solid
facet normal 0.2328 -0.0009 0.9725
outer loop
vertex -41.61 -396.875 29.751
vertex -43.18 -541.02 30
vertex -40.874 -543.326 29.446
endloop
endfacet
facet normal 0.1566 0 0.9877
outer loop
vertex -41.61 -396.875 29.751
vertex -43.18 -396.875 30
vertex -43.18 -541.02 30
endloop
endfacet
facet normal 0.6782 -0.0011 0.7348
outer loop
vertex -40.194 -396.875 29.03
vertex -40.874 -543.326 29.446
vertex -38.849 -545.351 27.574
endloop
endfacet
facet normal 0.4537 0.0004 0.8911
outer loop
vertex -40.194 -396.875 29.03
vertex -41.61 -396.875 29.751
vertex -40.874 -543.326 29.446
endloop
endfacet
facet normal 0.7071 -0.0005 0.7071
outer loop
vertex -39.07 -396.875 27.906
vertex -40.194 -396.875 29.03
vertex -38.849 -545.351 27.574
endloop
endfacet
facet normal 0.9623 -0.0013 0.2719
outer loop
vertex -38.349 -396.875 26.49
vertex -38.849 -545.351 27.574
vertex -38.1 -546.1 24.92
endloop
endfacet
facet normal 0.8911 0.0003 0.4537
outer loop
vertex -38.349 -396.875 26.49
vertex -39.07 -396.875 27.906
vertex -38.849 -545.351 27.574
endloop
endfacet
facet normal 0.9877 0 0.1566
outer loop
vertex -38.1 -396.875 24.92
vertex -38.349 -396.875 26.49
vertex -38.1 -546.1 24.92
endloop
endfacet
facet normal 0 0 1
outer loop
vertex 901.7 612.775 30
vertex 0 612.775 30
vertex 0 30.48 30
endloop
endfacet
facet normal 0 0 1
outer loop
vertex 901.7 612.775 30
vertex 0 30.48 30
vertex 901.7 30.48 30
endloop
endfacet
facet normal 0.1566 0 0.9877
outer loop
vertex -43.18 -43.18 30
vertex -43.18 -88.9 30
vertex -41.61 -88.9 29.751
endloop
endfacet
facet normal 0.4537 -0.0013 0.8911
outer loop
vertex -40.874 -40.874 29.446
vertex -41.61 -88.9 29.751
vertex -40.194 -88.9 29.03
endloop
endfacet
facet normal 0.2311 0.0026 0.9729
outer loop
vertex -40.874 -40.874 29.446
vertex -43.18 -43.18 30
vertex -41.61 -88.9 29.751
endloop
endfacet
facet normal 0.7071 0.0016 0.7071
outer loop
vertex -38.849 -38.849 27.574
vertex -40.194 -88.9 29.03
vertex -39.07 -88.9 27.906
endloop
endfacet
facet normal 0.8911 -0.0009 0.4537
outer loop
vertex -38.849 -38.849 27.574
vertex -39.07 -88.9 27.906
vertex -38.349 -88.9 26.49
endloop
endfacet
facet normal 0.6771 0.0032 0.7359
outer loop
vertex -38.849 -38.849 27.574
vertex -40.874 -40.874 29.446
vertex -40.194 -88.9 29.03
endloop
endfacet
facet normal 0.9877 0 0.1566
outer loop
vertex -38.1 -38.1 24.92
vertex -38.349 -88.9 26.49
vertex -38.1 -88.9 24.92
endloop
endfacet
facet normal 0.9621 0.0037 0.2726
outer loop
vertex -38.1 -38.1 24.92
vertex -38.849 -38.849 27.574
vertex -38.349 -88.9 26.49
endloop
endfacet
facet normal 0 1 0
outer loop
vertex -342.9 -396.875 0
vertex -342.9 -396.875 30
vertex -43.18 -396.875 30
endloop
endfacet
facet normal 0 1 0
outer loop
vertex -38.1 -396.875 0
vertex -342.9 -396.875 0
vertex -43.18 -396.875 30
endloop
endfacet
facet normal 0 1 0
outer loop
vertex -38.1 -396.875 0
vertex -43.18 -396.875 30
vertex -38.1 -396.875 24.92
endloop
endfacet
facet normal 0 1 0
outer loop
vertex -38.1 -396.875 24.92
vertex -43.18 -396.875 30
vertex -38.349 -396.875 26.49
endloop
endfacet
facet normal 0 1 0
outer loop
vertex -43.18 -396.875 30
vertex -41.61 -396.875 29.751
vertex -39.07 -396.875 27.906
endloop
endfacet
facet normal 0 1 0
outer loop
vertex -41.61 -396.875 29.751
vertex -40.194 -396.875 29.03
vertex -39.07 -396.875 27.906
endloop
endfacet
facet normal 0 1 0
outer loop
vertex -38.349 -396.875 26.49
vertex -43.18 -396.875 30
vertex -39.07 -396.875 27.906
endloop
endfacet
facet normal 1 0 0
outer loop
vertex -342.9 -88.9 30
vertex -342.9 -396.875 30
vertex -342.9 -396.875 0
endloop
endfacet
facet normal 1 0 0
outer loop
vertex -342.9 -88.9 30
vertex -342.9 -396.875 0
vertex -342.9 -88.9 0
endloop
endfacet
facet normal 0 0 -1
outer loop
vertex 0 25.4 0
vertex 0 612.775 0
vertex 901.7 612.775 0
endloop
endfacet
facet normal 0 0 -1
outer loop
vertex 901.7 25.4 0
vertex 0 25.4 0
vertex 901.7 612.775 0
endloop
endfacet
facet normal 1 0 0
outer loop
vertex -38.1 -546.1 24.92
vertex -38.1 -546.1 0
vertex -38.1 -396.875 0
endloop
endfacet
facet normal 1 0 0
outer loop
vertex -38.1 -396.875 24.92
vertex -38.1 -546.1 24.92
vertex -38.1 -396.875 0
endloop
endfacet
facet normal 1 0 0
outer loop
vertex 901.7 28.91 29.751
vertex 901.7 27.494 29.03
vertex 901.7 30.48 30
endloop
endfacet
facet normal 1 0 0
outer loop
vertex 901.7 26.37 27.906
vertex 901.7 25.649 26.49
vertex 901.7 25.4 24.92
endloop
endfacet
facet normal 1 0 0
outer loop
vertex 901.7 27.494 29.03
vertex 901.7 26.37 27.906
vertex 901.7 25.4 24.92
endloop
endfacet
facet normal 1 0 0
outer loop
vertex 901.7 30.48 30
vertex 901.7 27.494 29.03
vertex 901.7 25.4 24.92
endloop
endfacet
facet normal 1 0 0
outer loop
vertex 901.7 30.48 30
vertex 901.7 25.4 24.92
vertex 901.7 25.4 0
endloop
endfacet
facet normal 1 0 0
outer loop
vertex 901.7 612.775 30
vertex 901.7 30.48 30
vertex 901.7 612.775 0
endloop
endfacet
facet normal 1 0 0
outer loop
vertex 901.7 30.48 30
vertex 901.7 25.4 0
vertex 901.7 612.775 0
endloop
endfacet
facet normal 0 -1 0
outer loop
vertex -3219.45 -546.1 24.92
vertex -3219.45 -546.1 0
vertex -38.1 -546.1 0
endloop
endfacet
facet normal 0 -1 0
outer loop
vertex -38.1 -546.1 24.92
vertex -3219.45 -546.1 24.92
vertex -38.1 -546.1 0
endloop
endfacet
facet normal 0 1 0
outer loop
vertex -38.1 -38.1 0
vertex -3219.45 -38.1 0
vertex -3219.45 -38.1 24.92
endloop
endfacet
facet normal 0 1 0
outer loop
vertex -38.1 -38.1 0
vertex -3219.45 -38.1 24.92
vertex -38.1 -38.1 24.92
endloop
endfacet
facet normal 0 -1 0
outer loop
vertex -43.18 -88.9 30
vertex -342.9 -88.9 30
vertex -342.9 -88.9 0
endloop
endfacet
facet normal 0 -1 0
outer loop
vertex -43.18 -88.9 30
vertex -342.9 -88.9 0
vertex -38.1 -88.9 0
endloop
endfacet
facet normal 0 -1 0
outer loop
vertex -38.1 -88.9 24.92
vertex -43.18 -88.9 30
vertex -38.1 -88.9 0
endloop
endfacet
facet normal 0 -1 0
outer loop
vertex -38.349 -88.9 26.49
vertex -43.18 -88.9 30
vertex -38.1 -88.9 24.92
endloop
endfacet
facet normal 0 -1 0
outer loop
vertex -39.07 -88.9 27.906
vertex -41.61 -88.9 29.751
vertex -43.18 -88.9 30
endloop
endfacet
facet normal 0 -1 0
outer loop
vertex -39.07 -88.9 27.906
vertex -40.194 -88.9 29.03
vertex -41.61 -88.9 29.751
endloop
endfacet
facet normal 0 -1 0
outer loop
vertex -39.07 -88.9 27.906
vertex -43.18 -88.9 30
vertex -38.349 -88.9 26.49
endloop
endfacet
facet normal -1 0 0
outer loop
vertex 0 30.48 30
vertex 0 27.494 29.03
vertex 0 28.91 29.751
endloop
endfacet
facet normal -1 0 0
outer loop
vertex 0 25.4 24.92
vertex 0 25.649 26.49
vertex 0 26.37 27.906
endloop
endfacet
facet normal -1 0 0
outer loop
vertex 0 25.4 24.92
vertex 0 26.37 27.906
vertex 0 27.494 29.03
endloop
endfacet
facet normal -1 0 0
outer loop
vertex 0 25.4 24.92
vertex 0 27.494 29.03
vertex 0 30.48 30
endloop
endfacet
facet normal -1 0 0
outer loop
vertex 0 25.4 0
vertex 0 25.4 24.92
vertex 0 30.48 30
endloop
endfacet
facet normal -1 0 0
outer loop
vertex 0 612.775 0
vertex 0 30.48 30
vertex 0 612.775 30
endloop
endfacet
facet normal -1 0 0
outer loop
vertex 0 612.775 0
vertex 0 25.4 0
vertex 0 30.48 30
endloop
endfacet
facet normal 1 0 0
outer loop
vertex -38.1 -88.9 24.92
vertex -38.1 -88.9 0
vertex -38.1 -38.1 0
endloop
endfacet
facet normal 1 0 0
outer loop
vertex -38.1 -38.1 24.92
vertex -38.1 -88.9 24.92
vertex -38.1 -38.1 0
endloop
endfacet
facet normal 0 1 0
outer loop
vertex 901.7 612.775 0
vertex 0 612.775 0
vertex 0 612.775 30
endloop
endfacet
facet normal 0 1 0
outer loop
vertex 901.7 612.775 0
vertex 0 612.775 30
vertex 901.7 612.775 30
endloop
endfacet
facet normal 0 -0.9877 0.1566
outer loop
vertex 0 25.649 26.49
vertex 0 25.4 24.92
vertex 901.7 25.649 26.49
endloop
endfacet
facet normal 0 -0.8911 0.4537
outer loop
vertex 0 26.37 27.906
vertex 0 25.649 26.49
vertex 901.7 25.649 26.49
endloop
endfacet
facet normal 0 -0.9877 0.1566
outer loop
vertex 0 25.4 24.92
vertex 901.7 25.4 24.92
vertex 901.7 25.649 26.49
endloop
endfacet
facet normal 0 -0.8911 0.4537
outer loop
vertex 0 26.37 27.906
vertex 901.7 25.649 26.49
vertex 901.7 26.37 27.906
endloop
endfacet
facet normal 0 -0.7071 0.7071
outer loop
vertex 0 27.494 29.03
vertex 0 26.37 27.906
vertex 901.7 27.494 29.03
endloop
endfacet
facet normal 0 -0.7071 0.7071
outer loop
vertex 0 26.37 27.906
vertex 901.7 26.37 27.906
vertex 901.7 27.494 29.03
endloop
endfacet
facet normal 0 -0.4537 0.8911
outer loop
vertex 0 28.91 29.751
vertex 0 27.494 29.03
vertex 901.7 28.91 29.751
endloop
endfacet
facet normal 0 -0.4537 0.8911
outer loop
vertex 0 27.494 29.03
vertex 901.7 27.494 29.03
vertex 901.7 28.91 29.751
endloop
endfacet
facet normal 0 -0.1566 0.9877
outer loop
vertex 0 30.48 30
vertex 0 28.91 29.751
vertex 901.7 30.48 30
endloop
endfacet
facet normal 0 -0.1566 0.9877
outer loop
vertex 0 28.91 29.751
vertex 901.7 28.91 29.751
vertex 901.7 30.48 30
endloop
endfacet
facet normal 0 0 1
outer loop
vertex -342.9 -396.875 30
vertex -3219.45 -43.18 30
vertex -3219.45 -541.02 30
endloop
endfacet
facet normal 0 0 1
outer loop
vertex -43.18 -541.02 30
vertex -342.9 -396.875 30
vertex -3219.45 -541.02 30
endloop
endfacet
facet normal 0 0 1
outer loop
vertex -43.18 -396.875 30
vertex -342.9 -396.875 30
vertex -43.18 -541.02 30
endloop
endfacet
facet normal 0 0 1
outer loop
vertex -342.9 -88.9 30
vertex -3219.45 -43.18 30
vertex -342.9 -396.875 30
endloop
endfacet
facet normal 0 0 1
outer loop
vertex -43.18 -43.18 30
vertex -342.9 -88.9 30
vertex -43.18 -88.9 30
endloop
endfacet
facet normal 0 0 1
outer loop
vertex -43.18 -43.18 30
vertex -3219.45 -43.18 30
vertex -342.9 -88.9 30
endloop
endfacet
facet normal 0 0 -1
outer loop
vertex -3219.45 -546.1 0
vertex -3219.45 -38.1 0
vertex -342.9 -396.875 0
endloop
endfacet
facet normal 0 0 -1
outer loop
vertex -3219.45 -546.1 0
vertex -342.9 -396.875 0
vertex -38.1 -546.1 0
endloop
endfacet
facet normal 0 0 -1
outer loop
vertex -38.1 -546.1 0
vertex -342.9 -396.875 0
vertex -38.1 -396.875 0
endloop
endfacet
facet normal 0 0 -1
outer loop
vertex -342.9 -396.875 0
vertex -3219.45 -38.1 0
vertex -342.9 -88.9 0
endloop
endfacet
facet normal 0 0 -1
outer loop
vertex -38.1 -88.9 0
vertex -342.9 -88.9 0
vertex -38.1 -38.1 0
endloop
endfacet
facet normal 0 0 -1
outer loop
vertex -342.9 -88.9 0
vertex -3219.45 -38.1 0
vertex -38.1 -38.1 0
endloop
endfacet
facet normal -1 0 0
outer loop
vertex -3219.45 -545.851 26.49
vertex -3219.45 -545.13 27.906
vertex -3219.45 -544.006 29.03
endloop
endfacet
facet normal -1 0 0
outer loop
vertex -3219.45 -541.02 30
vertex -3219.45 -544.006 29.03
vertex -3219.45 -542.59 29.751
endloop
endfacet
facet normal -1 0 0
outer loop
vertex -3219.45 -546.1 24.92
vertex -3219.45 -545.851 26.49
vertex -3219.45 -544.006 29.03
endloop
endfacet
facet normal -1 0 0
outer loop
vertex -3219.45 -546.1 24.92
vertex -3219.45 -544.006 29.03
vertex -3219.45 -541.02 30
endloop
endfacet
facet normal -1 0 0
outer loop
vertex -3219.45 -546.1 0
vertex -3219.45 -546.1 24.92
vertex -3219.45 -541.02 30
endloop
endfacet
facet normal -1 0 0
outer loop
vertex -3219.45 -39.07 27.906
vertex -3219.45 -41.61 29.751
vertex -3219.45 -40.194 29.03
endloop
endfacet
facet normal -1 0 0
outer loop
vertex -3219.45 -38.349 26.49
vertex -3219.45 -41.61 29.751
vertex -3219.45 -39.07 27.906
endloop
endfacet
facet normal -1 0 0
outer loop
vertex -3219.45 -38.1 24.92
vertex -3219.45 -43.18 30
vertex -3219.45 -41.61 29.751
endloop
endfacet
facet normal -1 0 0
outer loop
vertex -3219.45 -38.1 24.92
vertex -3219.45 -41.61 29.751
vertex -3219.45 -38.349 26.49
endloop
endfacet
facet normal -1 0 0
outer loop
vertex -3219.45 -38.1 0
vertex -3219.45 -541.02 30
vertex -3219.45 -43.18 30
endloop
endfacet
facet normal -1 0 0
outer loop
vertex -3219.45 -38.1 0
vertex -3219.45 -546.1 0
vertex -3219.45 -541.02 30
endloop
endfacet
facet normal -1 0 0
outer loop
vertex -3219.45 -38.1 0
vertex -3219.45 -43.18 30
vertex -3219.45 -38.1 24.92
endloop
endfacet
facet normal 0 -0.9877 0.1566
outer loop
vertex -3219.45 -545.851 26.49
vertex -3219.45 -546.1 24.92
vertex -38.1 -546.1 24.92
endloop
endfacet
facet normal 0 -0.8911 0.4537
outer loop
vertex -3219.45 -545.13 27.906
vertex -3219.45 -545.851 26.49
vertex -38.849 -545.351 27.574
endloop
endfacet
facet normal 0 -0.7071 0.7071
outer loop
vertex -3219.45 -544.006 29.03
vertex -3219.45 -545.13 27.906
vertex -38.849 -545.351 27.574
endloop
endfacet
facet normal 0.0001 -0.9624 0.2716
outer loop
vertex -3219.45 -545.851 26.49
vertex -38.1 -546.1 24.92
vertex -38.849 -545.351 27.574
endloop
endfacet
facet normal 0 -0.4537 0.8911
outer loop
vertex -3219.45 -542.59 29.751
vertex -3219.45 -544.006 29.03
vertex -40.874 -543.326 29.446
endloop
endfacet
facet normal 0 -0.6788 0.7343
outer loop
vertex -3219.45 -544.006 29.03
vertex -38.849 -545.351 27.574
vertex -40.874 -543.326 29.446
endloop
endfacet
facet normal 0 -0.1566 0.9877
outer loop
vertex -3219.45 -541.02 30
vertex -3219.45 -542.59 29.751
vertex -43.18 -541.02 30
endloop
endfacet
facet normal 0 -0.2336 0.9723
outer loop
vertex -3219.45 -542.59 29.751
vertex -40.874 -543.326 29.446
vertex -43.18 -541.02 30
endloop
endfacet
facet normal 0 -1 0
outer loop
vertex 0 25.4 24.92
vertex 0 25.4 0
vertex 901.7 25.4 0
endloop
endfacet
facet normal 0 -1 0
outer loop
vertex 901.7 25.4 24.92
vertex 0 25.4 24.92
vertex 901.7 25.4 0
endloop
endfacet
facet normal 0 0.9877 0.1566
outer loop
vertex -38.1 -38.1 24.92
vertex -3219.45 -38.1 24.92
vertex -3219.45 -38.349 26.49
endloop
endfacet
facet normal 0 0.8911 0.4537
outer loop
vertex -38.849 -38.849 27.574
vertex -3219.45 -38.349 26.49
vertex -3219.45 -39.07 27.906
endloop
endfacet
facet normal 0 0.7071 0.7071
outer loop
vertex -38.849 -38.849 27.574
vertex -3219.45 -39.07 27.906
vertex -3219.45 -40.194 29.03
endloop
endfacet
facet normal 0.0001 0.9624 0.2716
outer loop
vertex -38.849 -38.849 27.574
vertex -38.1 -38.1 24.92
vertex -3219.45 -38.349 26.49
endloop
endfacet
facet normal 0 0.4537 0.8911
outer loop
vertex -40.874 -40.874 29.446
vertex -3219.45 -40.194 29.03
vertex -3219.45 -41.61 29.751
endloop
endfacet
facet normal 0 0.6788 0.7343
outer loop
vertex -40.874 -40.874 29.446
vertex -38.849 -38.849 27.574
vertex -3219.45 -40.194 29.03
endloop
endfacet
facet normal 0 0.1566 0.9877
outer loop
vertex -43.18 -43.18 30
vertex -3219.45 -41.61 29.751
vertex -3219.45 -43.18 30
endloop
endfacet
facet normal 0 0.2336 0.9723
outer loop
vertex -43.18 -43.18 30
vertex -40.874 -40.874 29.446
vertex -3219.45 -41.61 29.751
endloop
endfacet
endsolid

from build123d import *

# Parameters (mm, degrees)
F0_W     = 901.7
F0_H     = 587.375
F1_DEPTH = 30
F2_W     = 3181.35
F2_H     = 508
F3_DEPTH = 30
F4_W     = 304.8
F4_H     = 307.975
F5_DEPTH = 30.001
F6_R     = 5.08
F6_2_R   = 5.08


with BuildPart() as f1:
    # F0 (on Top) → F1 (new body)
    with BuildSketch(Plane.XY):
        with Locations((450.85, 319.0875)):
            Rectangle(F0_W, F0_H)
    extrude(amount=F1_DEPTH)

    # F6#2
    f6_2_edges = [f1.edges().sort_by_distance(p)[0] for p in [
        (450.85, 25.4, 30),
    ]]
    fillet(f6_2_edges, radius=F6_2_R)


with BuildPart() as f3:
    # F2 (on Top) → F3 (new body)
    with BuildSketch(Plane.XY):
        with Locations((-1628.775, -292.1)):
            Rectangle(F2_W, F2_H)
    extrude(amount=F3_DEPTH)

    # F4 (on face) → F5 (cut, through all)
    with BuildSketch(Plane.XY.offset(30)):
        with Locations((-190.5, -242.8875)):
            Rectangle(F4_W, F4_H)
    extrude(amount=-F5_DEPTH, mode=Mode.SUBTRACT)

    # F6
    f6_edges = [f3.edges().sort_by_distance(p)[0] for p in [
        (-38.1, -471.4875, 30),
        (-38.1, -63.5, 30),
        (-1628.775, -546.1, 30),
        (-1628.775, -38.1, 30),
    ]]
    fillet(f6_edges, radius=F6_R)


solid = Compound([f1.part, f3.part])
